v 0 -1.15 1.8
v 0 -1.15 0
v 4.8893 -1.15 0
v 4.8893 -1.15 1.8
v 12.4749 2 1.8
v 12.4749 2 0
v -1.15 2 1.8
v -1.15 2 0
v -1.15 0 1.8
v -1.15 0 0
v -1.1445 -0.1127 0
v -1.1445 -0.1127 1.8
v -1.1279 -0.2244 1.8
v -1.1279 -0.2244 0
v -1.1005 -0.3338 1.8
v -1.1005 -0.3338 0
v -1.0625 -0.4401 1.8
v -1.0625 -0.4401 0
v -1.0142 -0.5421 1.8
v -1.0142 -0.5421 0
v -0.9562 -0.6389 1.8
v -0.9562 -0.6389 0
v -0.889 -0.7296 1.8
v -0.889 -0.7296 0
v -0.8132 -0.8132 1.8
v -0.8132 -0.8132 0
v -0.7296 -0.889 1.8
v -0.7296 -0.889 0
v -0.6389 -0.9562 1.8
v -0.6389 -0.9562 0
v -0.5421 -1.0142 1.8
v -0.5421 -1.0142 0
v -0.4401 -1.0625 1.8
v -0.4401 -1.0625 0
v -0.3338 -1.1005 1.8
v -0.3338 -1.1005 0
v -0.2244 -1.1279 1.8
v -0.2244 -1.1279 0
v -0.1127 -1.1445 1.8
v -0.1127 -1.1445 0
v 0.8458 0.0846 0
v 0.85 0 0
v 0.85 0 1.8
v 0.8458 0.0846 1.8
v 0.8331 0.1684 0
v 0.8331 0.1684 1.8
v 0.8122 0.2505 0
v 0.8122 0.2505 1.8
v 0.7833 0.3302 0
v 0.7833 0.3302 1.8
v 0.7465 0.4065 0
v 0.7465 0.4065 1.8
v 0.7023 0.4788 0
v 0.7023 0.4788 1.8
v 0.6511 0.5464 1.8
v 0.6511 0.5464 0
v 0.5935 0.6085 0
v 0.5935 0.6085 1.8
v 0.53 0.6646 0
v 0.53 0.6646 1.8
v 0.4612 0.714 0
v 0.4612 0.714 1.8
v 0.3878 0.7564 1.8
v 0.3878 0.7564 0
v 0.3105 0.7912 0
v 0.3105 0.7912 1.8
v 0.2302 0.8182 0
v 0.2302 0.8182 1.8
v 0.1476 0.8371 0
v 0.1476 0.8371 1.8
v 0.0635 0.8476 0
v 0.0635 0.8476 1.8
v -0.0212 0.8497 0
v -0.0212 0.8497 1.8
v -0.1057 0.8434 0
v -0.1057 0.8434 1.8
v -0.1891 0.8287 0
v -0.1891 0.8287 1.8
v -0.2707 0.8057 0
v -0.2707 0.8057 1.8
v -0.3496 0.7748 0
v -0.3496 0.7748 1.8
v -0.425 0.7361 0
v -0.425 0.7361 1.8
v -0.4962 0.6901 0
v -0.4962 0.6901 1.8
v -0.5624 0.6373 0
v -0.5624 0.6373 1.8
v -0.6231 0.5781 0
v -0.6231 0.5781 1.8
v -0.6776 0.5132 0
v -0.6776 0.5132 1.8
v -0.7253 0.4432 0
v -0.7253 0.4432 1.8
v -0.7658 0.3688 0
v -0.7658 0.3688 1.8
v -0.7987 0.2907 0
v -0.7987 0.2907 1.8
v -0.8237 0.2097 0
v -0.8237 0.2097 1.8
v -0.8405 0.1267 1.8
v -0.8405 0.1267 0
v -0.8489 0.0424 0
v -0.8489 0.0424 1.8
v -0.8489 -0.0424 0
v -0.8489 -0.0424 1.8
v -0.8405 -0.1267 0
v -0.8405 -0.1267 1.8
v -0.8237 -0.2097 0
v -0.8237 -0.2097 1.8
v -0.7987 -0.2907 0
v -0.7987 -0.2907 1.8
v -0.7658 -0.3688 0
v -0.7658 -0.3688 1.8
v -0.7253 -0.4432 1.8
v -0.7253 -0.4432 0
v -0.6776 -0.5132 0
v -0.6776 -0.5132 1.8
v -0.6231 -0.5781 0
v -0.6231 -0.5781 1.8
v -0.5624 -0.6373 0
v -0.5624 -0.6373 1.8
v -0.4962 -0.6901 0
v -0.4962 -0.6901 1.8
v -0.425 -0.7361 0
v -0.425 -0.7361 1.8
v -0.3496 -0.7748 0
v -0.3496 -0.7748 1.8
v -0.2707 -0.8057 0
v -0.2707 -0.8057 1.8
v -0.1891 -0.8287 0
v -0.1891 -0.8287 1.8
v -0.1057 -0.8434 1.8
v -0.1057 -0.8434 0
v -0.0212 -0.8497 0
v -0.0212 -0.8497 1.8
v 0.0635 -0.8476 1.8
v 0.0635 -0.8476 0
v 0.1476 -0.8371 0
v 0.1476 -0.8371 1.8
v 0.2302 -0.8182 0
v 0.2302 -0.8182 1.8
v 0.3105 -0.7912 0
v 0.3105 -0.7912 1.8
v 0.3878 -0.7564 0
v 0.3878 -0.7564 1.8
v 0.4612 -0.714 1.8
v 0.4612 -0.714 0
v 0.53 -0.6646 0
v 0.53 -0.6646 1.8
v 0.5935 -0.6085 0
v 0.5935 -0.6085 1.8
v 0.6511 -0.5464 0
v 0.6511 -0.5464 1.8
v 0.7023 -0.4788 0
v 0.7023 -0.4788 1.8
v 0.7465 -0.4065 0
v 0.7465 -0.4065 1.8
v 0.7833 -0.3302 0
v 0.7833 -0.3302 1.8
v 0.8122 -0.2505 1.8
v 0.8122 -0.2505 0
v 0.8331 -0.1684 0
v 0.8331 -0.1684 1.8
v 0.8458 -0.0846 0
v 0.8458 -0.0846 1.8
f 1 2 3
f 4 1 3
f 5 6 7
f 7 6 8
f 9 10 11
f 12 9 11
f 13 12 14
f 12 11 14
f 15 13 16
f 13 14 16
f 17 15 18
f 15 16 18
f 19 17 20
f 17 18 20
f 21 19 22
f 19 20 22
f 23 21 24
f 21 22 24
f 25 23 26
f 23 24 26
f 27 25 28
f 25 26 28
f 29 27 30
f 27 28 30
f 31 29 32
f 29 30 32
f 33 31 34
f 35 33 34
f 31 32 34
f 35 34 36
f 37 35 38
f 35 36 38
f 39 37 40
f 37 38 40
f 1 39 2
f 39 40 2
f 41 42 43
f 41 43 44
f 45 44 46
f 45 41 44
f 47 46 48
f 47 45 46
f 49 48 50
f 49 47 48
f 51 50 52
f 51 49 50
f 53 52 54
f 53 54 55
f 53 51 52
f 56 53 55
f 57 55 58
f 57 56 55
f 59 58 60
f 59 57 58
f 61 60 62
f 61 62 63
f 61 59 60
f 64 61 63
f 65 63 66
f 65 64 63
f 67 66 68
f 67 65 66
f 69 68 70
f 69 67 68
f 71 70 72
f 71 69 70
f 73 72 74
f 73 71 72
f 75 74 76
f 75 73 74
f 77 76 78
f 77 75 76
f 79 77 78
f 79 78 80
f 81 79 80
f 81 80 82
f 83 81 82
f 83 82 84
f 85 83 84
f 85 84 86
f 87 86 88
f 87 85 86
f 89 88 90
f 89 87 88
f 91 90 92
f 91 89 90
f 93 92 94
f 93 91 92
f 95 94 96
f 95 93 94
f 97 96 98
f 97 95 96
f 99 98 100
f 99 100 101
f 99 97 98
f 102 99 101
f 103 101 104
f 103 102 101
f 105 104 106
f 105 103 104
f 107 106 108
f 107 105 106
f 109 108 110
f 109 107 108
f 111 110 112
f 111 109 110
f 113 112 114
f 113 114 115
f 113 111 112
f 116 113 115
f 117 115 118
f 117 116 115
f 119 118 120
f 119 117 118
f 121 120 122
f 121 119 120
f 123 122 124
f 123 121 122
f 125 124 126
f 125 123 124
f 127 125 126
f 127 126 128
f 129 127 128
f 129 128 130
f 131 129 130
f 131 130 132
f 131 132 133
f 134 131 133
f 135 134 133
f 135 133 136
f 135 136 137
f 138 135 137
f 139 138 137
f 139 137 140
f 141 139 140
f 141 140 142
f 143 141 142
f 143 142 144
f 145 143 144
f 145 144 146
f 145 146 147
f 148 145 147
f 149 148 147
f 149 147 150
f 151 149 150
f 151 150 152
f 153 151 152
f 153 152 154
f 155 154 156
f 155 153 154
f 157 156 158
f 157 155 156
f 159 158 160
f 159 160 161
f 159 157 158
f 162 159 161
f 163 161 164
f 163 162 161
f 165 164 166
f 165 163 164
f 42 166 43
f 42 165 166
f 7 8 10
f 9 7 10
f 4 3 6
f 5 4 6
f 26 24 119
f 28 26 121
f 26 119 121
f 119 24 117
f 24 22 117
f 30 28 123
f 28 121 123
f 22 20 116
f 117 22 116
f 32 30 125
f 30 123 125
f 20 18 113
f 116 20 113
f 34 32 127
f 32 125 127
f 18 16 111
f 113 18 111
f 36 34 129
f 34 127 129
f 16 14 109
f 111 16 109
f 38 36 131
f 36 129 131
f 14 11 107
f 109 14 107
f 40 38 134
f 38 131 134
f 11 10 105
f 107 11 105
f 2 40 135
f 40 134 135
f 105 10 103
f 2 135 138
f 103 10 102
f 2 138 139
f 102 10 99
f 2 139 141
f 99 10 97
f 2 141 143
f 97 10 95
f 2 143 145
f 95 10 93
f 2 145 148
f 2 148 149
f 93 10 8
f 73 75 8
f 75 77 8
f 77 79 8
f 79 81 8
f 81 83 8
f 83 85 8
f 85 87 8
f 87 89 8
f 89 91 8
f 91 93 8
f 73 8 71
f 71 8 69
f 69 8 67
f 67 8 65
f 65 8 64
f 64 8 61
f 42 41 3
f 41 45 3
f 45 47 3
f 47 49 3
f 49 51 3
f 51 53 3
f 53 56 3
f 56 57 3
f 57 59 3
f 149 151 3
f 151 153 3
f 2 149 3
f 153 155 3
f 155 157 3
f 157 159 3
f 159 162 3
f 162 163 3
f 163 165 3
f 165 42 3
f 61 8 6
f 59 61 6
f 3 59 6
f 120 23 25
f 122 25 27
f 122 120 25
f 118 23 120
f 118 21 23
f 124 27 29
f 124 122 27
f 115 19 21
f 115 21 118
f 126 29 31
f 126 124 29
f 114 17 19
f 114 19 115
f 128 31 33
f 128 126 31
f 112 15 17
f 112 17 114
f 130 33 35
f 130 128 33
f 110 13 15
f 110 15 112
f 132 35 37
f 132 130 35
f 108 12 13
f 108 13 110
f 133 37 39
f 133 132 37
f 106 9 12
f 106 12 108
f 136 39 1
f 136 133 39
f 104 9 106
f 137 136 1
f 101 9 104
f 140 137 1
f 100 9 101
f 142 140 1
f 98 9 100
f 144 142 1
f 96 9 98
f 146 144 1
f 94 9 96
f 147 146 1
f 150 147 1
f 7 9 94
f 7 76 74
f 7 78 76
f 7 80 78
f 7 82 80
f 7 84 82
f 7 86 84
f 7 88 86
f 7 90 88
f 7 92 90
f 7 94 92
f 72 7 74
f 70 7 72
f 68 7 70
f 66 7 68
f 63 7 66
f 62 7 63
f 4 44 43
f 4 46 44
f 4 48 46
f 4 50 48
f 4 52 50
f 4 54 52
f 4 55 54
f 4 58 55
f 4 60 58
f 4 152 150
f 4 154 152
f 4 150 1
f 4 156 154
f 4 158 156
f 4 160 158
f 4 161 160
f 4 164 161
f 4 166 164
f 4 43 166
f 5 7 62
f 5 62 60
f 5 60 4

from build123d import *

# Parameters (mm, degrees)
SKETCH2_R           = 1.15
SKETCH2_R_2         = 0.85
BOSS_EXTRUDE1_DEPTH = 1.8


with BuildPart() as part:
    # Sketch2 → Boss-Extrude1 (new body)
    with BuildSketch(Plane.XY):
        Circle(SKETCH2_R)
        Circle(SKETCH2_R_2, mode=Mode.SUBTRACT)
        with BuildLine():
            Line((-1.15, 2), (-1.15, 0))
            ThreePointArc((-1.15, 0), (0, 1.15), (1.15, 0))
            ThreePointArc((1.15, 0), (0.813172798, -0.813172798), (0, -1.15))
            Line((0, -1.15), (4.889316376, -1.15))
            Line((4.889316376, -1.15), (12.47489452, 2))
            Line((12.47489452, 2), (-1.15, 2))
        make_face()
    extrude(amount=BOSS_EXTRUDE1_DEPTH)


solid = part.part
